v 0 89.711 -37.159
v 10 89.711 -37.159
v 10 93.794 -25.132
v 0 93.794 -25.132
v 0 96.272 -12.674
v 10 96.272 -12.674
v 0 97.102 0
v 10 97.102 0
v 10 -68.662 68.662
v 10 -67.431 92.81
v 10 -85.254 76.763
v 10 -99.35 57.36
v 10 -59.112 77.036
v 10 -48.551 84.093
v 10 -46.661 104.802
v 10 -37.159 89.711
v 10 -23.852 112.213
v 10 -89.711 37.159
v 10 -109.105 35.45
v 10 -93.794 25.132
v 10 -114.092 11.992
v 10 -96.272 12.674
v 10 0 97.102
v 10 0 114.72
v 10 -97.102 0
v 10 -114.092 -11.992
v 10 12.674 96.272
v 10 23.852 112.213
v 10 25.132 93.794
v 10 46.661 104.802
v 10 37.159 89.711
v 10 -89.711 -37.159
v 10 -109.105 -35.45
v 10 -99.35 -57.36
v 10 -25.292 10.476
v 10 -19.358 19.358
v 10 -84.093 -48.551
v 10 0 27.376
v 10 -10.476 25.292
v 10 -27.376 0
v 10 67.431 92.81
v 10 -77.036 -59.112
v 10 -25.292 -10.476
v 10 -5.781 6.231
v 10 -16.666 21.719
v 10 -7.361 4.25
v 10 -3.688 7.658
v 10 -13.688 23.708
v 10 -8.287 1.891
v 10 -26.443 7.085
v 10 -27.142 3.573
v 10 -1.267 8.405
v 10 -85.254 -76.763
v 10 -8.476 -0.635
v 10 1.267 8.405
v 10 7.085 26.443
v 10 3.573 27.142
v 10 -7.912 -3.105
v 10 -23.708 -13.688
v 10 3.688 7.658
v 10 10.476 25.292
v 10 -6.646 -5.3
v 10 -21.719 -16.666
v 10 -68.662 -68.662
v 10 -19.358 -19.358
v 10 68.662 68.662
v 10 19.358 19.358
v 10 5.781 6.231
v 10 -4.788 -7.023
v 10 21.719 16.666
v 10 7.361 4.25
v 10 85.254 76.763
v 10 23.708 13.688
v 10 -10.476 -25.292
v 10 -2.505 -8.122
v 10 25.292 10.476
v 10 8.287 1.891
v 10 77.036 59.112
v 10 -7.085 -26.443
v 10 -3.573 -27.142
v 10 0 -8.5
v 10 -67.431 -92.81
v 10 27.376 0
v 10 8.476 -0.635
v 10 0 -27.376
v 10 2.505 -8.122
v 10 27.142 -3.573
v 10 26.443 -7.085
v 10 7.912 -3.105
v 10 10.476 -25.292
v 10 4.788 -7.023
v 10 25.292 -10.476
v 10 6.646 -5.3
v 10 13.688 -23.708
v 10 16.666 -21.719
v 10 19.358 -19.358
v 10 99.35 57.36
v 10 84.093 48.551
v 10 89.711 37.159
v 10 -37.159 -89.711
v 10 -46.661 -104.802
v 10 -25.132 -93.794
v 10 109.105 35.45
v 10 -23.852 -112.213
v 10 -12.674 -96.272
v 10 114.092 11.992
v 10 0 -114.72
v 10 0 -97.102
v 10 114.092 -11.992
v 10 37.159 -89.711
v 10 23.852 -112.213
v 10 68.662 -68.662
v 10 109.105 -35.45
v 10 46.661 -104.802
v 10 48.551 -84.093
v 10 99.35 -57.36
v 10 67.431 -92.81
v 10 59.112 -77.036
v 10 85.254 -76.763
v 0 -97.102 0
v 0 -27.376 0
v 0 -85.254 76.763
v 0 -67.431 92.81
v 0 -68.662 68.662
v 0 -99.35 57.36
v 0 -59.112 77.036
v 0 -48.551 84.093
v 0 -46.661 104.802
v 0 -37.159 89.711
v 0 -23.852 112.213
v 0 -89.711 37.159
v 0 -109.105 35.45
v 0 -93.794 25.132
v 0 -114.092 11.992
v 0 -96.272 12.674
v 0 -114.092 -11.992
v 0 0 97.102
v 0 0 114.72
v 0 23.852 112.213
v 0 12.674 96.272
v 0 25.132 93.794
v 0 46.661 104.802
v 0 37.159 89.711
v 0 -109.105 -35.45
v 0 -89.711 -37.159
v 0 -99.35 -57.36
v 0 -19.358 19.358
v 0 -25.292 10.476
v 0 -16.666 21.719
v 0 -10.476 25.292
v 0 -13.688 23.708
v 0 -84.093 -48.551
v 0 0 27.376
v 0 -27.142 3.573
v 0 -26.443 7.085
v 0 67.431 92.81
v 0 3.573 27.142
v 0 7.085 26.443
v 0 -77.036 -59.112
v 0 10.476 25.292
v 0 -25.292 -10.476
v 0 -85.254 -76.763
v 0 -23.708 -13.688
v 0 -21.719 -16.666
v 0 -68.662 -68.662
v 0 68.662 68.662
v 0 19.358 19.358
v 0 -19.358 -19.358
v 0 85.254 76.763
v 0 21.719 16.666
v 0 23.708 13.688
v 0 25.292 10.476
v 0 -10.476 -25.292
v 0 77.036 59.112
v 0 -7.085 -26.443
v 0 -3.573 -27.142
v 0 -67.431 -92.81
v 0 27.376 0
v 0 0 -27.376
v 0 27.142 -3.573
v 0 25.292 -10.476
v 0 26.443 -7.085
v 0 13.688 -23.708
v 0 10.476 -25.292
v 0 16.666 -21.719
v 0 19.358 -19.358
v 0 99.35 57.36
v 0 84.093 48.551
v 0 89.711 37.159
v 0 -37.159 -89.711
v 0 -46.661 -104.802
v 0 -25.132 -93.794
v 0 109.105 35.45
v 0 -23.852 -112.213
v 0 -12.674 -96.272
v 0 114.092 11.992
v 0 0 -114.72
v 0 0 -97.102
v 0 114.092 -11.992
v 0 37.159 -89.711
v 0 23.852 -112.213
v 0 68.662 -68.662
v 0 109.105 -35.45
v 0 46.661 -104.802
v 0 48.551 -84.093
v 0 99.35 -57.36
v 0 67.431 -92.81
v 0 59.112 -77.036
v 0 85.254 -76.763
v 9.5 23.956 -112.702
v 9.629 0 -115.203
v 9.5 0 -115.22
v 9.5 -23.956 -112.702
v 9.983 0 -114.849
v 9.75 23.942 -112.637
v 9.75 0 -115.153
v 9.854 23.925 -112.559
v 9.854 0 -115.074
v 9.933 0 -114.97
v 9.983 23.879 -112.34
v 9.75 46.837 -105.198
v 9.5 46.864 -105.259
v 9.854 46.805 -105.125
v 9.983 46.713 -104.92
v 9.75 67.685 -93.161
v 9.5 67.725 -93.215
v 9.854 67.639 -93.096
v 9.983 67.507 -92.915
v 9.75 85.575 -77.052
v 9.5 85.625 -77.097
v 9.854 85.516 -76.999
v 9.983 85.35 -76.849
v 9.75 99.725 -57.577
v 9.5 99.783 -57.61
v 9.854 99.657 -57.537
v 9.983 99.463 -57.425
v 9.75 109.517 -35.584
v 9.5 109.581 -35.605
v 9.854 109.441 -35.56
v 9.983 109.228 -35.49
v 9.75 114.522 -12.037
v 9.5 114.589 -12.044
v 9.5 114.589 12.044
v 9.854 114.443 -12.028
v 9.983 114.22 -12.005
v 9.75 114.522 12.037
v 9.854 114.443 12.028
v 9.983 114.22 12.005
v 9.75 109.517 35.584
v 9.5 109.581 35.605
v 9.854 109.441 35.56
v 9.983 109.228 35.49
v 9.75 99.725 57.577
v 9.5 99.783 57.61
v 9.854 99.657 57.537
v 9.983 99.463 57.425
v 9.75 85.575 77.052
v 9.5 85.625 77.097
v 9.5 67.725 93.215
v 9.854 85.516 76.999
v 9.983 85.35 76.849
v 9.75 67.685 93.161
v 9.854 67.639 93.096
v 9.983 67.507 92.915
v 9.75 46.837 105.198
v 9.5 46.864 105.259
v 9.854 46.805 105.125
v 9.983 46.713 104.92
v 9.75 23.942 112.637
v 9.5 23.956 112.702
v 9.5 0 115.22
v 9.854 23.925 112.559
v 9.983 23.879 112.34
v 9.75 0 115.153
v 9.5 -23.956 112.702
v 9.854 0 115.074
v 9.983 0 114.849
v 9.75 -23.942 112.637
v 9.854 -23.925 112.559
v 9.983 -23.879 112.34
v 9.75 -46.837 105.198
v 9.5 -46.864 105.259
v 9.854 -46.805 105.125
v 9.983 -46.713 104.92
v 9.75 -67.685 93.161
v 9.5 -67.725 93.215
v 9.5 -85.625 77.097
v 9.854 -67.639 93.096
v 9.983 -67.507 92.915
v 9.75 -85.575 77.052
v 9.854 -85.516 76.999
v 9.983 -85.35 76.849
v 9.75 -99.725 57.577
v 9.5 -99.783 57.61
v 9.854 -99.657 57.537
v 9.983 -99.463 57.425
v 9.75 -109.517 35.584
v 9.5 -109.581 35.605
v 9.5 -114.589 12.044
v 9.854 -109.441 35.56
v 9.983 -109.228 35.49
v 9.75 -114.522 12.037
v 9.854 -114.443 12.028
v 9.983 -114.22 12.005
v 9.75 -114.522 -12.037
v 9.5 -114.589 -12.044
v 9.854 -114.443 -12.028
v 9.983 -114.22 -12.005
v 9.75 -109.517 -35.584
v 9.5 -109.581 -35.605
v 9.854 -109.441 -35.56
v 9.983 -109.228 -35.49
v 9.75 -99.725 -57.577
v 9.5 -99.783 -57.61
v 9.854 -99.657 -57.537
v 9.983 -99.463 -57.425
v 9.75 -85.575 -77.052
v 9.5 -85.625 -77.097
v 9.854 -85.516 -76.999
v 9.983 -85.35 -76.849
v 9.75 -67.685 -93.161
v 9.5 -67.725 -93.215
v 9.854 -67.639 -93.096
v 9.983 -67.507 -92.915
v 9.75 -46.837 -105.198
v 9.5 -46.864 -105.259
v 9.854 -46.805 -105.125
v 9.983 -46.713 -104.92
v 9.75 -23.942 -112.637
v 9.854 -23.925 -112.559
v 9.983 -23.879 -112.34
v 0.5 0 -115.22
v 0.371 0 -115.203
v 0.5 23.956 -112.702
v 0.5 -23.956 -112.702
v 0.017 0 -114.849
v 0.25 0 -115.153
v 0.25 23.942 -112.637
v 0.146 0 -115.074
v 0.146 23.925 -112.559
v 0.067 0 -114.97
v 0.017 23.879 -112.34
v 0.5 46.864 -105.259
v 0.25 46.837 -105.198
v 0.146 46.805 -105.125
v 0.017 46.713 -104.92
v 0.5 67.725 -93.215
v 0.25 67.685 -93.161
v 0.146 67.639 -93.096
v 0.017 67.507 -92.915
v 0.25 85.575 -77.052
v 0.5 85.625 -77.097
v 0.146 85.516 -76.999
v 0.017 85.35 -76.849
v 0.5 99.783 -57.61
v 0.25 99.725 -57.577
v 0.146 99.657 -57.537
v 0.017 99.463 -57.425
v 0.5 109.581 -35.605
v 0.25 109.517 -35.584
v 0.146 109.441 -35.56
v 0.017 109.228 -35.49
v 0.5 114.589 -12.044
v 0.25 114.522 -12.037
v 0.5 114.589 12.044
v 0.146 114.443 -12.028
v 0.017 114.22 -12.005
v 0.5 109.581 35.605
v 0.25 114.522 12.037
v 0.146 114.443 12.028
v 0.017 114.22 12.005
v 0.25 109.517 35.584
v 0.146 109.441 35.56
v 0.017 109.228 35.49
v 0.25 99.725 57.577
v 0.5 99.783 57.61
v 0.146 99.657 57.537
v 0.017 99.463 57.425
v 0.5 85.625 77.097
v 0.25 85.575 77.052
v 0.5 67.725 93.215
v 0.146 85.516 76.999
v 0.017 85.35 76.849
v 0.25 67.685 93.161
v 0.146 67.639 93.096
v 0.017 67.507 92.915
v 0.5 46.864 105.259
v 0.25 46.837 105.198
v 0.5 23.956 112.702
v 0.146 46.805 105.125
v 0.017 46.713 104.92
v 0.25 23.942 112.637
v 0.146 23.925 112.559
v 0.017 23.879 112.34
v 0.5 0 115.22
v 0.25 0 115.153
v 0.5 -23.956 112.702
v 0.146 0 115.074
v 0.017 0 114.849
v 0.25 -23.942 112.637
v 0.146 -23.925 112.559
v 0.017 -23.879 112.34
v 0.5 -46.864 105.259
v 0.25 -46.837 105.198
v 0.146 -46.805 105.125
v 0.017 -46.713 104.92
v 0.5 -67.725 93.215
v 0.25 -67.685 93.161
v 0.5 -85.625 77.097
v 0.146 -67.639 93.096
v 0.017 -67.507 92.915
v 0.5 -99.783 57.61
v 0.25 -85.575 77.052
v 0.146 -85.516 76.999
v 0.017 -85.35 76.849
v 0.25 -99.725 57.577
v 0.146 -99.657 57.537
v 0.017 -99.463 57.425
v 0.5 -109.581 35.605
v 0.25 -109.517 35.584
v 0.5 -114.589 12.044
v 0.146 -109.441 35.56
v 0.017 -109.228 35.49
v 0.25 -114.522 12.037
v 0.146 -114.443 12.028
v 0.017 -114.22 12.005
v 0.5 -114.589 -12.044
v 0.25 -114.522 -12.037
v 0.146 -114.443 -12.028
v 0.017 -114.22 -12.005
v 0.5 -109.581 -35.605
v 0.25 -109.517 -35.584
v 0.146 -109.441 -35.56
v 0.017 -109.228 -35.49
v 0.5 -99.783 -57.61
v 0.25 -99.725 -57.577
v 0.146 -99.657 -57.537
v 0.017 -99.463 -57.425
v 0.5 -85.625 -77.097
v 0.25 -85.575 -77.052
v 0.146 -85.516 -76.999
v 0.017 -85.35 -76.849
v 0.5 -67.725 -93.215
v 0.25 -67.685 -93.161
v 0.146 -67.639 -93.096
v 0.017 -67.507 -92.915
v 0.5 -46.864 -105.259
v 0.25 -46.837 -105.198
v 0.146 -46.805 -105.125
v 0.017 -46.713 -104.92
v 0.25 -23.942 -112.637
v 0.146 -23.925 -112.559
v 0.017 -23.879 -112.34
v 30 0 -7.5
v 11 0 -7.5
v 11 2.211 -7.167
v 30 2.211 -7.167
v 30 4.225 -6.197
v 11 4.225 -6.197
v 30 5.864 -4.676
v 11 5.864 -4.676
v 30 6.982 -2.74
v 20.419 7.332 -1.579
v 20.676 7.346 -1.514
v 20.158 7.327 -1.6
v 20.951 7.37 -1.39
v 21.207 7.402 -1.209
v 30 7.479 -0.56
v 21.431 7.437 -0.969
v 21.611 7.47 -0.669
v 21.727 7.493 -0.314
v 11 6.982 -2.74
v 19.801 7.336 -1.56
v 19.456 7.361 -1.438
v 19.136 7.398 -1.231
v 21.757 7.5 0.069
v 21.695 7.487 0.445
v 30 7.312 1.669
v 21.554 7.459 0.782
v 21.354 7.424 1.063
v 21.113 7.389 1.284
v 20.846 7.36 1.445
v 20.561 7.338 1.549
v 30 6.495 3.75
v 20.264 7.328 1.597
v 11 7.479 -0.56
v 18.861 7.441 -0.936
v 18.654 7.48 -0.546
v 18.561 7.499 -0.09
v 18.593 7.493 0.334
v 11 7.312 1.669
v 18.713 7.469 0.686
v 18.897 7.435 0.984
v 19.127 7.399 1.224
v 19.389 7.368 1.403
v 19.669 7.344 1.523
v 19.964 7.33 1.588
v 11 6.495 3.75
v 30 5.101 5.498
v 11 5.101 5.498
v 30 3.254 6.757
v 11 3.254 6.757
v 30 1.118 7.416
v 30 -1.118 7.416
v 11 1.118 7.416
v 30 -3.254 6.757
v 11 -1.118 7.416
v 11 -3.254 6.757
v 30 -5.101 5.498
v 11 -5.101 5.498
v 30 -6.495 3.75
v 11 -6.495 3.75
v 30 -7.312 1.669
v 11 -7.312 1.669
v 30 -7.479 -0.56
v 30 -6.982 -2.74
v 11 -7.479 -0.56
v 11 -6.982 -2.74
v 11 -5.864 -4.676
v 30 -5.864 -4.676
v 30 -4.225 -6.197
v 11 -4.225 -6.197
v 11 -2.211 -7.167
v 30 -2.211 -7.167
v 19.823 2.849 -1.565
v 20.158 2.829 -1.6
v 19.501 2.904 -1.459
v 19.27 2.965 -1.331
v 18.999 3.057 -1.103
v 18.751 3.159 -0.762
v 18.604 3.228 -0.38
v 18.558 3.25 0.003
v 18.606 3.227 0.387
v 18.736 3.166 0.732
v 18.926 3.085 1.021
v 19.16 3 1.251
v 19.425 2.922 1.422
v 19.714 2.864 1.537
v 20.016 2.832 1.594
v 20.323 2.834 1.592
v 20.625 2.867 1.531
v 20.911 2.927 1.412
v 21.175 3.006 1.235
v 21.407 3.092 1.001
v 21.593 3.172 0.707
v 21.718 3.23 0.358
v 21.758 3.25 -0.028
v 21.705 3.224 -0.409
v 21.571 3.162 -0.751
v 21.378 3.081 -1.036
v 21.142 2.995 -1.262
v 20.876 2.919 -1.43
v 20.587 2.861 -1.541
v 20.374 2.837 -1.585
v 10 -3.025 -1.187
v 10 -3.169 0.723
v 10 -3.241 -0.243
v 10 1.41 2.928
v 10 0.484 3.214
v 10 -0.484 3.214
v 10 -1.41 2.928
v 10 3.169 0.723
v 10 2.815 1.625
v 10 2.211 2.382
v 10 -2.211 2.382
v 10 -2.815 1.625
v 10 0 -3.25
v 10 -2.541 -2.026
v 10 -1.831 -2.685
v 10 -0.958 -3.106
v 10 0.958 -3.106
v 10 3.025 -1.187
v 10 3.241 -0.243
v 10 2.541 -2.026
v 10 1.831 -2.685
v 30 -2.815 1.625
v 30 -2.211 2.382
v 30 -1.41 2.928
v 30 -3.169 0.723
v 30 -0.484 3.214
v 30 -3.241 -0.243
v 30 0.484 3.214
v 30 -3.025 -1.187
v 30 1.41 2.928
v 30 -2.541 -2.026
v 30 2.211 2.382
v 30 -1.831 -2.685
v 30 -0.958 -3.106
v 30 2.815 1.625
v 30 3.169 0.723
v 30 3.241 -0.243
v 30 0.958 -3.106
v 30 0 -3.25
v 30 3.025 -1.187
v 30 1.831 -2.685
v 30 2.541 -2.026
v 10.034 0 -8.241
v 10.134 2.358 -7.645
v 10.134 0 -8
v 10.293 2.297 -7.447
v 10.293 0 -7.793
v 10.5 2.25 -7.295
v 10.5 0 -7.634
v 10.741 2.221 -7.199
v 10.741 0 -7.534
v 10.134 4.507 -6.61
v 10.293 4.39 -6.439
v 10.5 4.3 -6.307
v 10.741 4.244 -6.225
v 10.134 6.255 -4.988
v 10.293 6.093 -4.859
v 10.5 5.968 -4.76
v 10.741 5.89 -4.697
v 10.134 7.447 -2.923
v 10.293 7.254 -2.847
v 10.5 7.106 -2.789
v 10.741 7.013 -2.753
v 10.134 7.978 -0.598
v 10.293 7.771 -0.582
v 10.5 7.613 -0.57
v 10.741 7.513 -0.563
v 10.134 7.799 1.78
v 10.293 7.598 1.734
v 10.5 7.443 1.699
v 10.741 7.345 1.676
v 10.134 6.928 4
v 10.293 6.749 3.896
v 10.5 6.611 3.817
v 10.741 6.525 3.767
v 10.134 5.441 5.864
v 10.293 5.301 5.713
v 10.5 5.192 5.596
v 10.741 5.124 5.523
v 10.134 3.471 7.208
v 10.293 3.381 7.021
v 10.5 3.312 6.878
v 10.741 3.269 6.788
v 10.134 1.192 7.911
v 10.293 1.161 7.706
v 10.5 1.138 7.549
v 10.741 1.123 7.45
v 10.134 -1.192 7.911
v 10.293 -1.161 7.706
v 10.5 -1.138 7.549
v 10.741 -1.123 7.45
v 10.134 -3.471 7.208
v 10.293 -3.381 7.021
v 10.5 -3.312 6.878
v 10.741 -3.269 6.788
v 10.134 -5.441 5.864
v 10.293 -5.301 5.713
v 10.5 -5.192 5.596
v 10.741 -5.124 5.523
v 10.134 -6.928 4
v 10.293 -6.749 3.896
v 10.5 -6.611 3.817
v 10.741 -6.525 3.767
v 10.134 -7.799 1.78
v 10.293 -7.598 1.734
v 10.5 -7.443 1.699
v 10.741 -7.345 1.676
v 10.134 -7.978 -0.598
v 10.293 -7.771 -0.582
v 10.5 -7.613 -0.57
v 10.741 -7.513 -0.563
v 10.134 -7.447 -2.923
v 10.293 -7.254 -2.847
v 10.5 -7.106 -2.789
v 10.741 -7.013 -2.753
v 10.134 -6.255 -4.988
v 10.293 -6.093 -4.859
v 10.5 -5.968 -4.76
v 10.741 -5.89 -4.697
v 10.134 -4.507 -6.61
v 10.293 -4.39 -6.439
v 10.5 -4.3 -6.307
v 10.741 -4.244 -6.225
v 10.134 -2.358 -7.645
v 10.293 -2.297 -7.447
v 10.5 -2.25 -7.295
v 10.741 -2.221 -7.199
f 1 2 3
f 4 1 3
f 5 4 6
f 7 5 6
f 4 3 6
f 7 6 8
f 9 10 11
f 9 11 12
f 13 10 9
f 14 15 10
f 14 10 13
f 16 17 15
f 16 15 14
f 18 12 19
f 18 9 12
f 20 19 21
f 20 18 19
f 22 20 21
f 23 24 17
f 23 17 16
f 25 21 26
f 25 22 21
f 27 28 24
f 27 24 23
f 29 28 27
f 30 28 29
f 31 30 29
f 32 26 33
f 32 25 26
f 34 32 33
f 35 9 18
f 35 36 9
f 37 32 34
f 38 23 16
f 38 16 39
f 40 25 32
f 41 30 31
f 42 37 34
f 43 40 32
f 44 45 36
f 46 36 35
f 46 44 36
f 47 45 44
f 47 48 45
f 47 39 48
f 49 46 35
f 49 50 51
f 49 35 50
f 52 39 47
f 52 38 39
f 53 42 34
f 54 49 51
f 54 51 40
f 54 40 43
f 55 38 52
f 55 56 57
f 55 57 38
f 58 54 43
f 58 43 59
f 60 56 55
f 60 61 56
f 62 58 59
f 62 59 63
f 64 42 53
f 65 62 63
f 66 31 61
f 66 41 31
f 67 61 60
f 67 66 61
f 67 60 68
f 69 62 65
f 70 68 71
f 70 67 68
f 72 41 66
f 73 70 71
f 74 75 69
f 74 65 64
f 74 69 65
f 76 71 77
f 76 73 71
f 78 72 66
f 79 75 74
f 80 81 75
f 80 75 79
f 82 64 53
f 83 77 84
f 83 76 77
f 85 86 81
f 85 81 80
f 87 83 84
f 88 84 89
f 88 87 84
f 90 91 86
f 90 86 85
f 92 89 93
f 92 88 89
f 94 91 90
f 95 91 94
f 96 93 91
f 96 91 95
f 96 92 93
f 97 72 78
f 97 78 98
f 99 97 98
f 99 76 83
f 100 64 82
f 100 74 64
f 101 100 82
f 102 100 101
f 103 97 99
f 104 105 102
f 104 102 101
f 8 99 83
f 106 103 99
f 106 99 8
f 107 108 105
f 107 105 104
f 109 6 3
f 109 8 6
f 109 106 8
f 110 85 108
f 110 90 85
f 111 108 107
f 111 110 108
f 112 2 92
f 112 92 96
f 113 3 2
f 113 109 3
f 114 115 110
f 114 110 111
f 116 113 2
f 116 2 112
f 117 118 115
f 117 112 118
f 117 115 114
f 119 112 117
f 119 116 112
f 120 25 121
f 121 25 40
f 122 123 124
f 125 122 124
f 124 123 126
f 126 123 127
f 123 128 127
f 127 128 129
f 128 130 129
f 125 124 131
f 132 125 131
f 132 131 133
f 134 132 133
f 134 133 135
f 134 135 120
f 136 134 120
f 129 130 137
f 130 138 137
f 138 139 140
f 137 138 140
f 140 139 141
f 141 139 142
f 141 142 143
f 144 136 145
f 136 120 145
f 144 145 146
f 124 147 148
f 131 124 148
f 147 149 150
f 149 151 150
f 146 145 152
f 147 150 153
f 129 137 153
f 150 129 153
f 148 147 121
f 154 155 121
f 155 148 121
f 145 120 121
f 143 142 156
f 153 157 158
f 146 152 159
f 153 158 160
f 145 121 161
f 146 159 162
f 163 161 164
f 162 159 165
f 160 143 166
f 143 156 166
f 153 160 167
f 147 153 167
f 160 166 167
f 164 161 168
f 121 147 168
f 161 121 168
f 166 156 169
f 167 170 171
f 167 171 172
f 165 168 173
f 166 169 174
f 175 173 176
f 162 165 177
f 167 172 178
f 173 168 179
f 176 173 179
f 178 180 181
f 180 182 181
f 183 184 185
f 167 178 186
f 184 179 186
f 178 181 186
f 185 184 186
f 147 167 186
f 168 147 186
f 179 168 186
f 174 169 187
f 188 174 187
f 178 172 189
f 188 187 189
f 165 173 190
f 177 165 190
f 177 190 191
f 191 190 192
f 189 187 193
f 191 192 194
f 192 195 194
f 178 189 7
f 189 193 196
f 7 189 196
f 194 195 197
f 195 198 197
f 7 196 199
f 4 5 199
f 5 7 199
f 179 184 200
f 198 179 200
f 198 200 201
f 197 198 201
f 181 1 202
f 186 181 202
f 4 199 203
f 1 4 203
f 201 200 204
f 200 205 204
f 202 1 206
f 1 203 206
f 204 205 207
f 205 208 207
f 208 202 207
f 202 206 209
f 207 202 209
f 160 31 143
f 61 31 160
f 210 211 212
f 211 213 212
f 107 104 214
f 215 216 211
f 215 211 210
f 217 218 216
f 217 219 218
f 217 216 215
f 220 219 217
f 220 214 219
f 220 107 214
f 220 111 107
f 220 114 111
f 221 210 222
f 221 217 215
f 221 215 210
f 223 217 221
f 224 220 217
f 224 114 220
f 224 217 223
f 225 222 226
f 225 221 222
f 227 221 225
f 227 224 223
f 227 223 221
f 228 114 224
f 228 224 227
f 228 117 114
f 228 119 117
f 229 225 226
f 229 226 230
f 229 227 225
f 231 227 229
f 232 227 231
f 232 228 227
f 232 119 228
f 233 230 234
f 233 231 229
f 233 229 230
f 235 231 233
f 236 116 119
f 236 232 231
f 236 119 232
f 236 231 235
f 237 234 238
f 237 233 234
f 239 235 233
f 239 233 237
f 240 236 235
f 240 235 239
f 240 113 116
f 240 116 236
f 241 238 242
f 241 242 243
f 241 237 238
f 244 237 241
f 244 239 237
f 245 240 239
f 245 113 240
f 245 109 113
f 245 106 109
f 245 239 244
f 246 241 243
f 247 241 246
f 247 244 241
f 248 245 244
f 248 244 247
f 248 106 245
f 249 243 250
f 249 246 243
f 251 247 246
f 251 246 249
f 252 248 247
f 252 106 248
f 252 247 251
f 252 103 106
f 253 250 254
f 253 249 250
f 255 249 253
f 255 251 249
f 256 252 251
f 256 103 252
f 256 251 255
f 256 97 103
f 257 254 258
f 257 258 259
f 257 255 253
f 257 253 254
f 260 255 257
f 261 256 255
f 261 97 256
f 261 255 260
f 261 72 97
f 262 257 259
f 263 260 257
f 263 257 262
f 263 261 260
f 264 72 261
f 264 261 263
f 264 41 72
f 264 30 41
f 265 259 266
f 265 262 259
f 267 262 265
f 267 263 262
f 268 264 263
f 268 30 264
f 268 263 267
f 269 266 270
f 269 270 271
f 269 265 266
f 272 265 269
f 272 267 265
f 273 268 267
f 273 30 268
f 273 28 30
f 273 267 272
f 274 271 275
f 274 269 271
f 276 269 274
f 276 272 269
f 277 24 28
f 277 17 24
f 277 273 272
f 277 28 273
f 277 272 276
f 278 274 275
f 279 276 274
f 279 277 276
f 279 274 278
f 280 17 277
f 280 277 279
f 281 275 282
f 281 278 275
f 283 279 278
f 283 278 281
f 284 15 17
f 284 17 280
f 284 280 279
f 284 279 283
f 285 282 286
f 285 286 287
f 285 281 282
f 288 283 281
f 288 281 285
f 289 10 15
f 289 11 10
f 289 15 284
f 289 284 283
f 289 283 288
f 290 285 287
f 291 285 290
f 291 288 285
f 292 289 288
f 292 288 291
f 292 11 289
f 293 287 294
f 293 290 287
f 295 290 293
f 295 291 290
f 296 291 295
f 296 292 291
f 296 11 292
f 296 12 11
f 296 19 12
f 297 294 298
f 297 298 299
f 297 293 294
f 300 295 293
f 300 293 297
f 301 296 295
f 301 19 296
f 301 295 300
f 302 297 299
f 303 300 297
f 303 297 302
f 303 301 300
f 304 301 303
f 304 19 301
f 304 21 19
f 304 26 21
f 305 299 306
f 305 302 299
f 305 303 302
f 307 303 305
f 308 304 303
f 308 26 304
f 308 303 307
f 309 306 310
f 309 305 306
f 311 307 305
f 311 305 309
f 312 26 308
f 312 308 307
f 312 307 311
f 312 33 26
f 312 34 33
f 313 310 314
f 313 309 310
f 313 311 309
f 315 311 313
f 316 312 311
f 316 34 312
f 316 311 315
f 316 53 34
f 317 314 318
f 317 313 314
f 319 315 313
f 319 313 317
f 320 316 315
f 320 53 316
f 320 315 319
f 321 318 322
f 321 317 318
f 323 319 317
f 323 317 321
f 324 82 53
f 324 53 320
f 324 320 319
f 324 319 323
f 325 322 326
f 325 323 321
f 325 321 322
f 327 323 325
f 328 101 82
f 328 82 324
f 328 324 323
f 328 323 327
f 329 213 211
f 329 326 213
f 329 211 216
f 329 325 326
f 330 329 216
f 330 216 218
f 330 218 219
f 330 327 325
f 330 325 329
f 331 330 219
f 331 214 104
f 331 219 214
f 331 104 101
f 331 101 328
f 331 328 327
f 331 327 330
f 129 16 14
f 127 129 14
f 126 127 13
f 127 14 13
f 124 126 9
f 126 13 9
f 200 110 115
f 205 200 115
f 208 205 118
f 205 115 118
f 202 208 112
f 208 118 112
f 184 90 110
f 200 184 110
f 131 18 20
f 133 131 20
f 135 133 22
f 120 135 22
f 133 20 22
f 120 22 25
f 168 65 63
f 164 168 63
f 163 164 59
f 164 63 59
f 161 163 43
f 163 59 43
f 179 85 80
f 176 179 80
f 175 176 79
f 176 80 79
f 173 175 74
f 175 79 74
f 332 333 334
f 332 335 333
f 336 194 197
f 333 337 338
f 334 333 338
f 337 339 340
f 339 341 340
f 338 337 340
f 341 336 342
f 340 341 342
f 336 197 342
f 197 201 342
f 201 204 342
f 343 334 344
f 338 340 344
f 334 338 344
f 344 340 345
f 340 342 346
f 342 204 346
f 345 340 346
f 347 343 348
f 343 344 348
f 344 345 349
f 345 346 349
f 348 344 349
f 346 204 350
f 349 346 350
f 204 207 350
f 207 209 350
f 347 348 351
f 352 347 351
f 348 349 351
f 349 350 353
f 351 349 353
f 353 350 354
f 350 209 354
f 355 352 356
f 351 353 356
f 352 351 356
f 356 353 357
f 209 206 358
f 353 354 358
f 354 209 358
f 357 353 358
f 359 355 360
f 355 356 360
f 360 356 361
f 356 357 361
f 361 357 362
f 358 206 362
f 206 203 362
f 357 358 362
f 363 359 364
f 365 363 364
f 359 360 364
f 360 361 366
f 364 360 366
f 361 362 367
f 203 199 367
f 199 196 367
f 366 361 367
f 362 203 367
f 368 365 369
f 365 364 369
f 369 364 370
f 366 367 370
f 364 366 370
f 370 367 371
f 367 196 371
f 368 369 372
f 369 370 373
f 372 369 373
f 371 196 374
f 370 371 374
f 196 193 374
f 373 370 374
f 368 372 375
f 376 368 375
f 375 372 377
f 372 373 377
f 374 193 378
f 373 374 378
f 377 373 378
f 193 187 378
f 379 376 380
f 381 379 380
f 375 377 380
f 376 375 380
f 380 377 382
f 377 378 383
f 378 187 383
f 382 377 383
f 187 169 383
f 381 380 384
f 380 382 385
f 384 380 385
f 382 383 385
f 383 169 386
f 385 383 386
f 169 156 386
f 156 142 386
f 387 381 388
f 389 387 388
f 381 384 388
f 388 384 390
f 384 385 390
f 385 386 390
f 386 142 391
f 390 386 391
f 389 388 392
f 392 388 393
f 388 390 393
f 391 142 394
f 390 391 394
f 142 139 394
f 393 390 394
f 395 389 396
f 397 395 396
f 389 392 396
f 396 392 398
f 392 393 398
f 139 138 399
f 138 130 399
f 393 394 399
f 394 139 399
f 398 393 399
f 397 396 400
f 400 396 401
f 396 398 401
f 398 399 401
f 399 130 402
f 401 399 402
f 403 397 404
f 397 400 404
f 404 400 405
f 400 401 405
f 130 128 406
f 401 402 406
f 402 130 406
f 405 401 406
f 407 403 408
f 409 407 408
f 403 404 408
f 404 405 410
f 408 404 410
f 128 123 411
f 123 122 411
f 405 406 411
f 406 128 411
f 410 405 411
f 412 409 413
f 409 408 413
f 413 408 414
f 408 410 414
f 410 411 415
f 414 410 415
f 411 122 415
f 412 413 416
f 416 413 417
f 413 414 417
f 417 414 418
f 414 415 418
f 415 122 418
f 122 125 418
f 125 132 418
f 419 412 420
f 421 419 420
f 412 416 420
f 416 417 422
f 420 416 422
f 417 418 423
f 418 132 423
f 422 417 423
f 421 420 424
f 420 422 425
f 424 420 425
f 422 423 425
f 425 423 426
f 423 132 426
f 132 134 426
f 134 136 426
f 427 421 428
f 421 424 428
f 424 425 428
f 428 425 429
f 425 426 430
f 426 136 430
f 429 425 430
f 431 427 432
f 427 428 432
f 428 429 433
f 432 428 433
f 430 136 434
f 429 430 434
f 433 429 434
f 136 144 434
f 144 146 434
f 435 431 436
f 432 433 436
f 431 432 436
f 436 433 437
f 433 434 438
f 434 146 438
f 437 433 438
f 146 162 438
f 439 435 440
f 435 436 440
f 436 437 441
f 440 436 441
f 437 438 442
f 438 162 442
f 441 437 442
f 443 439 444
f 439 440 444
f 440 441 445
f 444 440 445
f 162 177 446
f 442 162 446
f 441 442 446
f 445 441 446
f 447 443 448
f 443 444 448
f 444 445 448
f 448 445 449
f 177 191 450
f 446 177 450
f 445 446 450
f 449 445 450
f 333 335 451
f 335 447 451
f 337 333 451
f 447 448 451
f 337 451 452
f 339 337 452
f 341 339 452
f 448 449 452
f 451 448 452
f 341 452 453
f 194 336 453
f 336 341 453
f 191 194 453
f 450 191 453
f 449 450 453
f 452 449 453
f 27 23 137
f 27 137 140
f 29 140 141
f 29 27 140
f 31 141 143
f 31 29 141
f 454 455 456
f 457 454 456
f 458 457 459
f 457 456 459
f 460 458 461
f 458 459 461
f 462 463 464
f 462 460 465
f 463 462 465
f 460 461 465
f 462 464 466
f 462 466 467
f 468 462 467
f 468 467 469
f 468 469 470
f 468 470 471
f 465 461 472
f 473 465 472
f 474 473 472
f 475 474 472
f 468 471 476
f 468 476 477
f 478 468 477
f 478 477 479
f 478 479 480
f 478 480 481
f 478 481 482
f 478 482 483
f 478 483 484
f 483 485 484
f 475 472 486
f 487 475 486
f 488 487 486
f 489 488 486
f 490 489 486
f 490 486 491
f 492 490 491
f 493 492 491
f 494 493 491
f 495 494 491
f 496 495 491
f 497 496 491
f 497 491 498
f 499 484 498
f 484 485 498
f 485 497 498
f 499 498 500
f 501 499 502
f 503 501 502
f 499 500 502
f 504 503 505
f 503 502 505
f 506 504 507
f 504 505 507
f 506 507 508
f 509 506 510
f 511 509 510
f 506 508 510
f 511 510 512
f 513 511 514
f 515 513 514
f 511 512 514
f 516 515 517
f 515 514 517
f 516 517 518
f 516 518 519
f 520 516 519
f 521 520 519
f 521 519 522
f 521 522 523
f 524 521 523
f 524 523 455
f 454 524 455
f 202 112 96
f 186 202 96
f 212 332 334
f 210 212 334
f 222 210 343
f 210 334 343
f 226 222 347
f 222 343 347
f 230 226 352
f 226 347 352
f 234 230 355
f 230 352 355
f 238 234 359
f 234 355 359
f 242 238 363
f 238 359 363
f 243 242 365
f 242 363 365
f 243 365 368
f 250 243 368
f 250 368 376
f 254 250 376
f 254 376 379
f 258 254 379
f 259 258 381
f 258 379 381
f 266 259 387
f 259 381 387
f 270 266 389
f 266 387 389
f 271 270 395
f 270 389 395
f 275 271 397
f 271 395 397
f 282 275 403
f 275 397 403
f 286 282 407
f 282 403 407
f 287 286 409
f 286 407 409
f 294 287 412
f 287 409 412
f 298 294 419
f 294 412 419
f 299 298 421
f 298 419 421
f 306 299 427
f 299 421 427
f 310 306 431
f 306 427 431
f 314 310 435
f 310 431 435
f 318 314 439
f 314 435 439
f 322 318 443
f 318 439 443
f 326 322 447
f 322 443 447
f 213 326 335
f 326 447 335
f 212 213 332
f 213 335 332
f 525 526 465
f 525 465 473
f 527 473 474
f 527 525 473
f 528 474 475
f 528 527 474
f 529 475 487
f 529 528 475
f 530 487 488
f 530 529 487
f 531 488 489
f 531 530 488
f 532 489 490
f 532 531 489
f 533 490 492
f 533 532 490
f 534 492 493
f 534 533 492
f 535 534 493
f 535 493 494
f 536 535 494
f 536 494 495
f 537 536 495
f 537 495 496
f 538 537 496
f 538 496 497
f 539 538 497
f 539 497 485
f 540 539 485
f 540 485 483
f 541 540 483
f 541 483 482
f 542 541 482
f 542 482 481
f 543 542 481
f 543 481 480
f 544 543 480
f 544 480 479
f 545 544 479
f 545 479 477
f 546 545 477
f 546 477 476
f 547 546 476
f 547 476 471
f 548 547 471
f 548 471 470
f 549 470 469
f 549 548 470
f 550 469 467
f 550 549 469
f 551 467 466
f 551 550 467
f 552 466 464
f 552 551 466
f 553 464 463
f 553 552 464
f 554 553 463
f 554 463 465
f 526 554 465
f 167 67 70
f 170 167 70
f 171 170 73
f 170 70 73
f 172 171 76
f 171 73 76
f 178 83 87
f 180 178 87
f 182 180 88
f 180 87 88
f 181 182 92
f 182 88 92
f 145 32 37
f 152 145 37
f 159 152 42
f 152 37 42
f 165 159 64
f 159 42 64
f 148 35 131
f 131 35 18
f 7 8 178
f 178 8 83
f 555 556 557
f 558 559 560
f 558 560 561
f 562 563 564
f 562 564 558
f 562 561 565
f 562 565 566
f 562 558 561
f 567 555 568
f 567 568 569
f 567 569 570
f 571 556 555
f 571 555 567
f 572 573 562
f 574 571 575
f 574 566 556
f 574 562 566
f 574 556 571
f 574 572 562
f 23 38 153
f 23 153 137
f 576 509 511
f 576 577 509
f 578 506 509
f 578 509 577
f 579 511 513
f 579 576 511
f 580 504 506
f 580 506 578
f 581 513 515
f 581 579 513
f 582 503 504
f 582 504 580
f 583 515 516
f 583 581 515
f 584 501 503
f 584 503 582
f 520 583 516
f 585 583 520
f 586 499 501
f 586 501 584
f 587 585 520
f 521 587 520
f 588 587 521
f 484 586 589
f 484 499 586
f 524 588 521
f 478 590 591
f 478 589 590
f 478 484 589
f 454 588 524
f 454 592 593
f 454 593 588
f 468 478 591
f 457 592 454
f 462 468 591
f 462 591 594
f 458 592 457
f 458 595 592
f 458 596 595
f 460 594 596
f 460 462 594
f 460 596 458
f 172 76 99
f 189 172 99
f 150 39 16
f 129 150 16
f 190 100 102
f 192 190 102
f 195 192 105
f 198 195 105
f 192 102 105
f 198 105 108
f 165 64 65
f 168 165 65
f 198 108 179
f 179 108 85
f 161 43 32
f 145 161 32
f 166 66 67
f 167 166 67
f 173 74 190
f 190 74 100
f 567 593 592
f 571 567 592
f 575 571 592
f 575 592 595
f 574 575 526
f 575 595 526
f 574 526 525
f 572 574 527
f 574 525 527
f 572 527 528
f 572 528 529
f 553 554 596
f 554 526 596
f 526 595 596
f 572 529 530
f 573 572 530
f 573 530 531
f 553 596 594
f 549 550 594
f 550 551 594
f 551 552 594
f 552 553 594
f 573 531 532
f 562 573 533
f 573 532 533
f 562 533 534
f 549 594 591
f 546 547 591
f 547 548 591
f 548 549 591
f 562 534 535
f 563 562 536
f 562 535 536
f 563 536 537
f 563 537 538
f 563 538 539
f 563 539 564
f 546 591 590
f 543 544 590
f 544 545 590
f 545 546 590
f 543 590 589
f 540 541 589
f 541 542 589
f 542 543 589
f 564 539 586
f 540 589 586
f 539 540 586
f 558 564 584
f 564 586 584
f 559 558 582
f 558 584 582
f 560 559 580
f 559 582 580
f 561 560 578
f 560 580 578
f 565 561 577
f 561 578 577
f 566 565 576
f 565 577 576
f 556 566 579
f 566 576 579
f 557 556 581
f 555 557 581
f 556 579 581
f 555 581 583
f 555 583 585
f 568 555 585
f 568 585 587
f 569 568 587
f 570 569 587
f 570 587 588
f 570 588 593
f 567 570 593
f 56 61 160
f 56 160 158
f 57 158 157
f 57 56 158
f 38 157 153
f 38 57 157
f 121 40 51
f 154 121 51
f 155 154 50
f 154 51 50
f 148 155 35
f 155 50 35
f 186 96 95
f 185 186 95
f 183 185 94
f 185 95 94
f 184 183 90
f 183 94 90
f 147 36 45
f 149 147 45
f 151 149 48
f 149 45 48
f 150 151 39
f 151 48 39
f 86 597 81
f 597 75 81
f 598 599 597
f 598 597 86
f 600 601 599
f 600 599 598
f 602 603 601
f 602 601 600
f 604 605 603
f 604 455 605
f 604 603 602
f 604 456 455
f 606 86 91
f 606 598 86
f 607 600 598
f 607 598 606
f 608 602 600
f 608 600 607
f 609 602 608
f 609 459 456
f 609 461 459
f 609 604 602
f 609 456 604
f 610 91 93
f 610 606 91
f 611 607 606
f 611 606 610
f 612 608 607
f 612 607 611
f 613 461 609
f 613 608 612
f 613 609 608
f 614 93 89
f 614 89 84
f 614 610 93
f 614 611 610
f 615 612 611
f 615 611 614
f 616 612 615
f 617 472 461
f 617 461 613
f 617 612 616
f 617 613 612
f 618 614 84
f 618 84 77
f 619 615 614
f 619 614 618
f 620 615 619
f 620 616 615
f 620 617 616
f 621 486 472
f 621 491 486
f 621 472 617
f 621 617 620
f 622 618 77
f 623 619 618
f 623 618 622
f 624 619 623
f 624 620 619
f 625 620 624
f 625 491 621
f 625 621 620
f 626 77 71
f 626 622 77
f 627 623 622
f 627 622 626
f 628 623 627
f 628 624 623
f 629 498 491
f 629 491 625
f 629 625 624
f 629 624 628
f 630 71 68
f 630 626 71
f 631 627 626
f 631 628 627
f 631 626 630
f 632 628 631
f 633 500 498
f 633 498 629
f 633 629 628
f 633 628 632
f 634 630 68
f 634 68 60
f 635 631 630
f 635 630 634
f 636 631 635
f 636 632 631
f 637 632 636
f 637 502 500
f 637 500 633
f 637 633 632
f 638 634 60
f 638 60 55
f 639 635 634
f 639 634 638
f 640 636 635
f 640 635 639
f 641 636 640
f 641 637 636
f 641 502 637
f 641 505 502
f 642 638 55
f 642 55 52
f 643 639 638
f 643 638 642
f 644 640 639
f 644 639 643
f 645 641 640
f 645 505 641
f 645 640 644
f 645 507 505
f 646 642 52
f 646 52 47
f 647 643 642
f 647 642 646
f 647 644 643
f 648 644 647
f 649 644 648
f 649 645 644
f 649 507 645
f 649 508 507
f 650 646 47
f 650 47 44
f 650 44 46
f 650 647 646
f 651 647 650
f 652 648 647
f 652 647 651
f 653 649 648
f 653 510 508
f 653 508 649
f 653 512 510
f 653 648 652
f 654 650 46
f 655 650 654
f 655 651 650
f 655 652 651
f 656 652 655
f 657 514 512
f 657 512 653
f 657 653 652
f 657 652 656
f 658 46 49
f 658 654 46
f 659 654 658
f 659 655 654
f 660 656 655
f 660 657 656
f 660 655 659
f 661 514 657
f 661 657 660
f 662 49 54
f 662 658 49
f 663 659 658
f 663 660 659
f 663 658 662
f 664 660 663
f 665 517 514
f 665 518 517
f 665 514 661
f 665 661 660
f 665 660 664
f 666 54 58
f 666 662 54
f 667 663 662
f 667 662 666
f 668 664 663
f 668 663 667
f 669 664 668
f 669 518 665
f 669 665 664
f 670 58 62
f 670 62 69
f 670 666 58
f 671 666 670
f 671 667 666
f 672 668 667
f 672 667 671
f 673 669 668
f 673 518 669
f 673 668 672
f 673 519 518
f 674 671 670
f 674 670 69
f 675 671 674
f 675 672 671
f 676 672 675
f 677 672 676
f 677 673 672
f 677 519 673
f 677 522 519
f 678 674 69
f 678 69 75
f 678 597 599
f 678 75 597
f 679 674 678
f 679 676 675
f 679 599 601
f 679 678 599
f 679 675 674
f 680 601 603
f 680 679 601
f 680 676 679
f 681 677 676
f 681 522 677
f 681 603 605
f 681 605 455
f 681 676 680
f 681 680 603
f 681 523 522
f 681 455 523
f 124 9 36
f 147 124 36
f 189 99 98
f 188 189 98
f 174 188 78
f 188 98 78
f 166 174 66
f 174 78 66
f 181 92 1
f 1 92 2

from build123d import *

# Parameters (mm, degrees)
SKETCH1_R           = 115.22
BOSS_EXTRUDE1_DEPTH = 10
FILLET1_R           = 0.5
CUT_EXTRUDE1_DEPTH  = 10
SKETCH3_R           = 7.5
BOSS_EXTRUDE2_DEPTH = 20
FILLET3_R           = 1
SKETCH4_R           = 3.25
CUT_EXTRUDE2_DEPTH  = 20
SKETCH5_R           = 1.6
CUT_EXTRUDE4_DEPTH  = 20


with BuildPart() as part:
    # Sketch1 → Boss-Extrude1 (new body)
    with BuildSketch(Plane(origin=(0, 0, 0), x_dir=(0, 0, -1), z_dir=(1, 0, 0))):
        Circle(SKETCH1_R)
    extrude(amount=BOSS_EXTRUDE1_DEPTH)

    # Fillet1
    fillet1_edges = [part.edges().sort_by_distance(p)[0] for p in [
        (0, 0, 115.22),
        (10, 0, 115.22),
    ]]
    fillet(fillet1_edges, radius=FILLET1_R)

    # Sketch2 → Cut-Extrude1 (cut)
    with BuildSketch(Plane(origin=(10, 0, 0), x_dir=(0, 0, -1), z_dir=(1, 0, 0))):
        with BuildLine():
            Line((-89.710835252, 37.159444653), (-25.292265207, 10.476399272))
            ThreePointArc((-25.292265207, 10.476399272), (-26.850125531, 5.340822034), (-27.376150588, 0))
            Line((-27.376150588, 0), (-97.102308359, 0))
            ThreePointArc((-97.102308359, 0), (-95.236514731, 18.943720606), (-89.710835252, 37.159444653))
        make_face()
        with BuildLine():
            Line((-68.661700709, 68.661700709), (-19.357861723, 19.357861723))
            ThreePointArc((-19.357861723, 19.357861723), (-15.209374361, 22.762437316), (-10.476399272, 25.292265207))
            Line((-10.476399272, 25.292265207), (-37.159444653, 89.710835252))
            ThreePointArc((-37.159444653, 89.710835252), (-53.947152082, 80.737618685), (-68.661700709, 68.661700709))
        make_face()
        with BuildLine():
            Line((0, 97.102308359), (0, 27.376150588))
            ThreePointArc((0, 27.376150588), (5.340822034, 26.850125531), (10.476399272, 25.292265207))
            Line((10.476399272, 25.292265207), (37.159444653, 89.710835252))
            ThreePointArc((37.159444653, 89.710835252), (18.943720606, 95.236514731), (0, 97.102308359))
        make_face()
        with BuildLine():
            Line((68.661700709, 68.661700709), (19.357861723, 19.357861723))
            ThreePointArc((19.357861723, 19.357861723), (22.762437316, 15.209374361), (25.292265207, 10.476399272))
            Line((25.292265207, 10.476399272), (89.710835252, 37.159444653))
            ThreePointArc((89.710835252, 37.159444653), (80.737618685, 53.947152082), (68.661700709, 68.661700709))
        make_face()
        with BuildLine():
            Line((97.102308359, 0), (27.376150588, 0))
            ThreePointArc((27.376150588, 0), (26.850125531, -5.340822034), (25.292265207, -10.476399272))
            Line((25.292265207, -10.476399272), (89.710835252, -37.159444653))
            ThreePointArc((89.710835252, -37.159444653), (95.236514731, -18.943720606), (97.102308359, 0))
        make_face()
        with BuildLine():
            Line((68.661700709, -68.661700709), (19.357861723, -19.357861723))
            ThreePointArc((19.357861723, -19.357861723), (15.209374361, -22.762437316), (10.476399272, -25.292265207))
            Line((10.476399272, -25.292265207), (37.159444653, -89.710835252))
            ThreePointArc((37.159444653, -89.710835252), (53.947152082, -80.737618685), (68.661700709, -68.661700709))
        make_face()
        with BuildLine():
            Line((0, -97.102308359), (0, -27.376150588))
            ThreePointArc((0, -27.376150588), (-5.340822034, -26.850125531), (-10.476399272, -25.292265207))
            Line((-10.476399272, -25.292265207), (-37.159444653, -89.710835252))
            ThreePointArc((-37.159444653, -89.710835252), (-18.943720606, -95.236514731), (0, -97.102308359))
        make_face()
        with BuildLine():
            Line((-68.661700709, -68.661700709), (-19.357861723, -19.357861723))
            ThreePointArc((-19.357861723, -19.357861723), (-22.762437316, -15.209374361), (-25.292265207, -10.476399272))
            Line((-25.292265207, -10.476399272), (-89.710835252, -37.159444653))
            ThreePointArc((-89.710835252, -37.159444653), (-80.737618685, -53.947152082), (-68.661700709, -68.661700709))
        make_face()
    extrude(amount=-CUT_EXTRUDE1_DEPTH, mode=Mode.SUBTRACT)

    # Sketch3 → Boss-Extrude2 (add)
    with BuildSketch(Plane(origin=(10, 0, 0), x_dir=(0, 0, -1), z_dir=(1, 0, 0))):
        Circle(SKETCH3_R)
    extrude(amount=BOSS_EXTRUDE2_DEPTH)

    # Fillet3
    fillet3_edges = [part.edges().sort_by_distance(p)[0] for p in [
        (10, 0, 7.5),
    ]]
    fillet(fillet3_edges, radius=FILLET3_R)

    # Sketch4 → Cut-Extrude2 (cut)
    with BuildSketch(Plane(origin=(30, 0, 0), x_dir=(0, 0, -1), z_dir=(1, 0, 0))):
        Circle(SKETCH4_R)
    extrude(amount=-CUT_EXTRUDE2_DEPTH, mode=Mode.SUBTRACT)

    # Sketch5 → Cut-Extrude4 (cut)
    with BuildSketch(Plane(origin=(0, 0, 0), x_dir=(1, 0, 0), z_dir=(0, 1, 0))):
        with Locations(Location((20.158087078, 0, 0), (0, 0, 90))):
            Circle(SKETCH5_R)
    extrude(amount=CUT_EXTRUDE4_DEPTH, mode=Mode.SUBTRACT)


solid = part.part
